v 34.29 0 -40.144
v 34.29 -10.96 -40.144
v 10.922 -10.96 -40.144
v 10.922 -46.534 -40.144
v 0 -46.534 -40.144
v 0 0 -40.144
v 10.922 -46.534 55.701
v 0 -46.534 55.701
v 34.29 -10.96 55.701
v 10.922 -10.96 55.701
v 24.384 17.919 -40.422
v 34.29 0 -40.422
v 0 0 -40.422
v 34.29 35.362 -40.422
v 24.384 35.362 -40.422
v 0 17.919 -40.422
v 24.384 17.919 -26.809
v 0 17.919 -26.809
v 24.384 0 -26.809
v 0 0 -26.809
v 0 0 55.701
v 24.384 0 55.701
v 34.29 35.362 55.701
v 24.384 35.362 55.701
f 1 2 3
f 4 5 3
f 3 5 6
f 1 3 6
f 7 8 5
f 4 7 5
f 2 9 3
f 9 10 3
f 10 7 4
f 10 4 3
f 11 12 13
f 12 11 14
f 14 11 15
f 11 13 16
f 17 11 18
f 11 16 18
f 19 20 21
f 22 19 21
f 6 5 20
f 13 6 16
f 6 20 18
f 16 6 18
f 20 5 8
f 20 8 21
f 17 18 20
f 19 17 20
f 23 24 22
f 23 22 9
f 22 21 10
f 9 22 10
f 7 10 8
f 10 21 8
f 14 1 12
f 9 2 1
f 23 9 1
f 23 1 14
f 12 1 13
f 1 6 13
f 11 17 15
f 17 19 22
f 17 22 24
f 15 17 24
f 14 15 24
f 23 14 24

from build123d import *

# Parameters (mm, degrees)
F1_DEPTH = 10.922
F3_DEPTH = 13.462
F5_DEPTH = 9.906


with BuildPart() as f1:
    # F0 (on Right) → F1 (new body)
    with BuildSketch(Plane.YZ):
        Polygon((0, 55.701409), (-46.533596, 55.701409), (-46.533596, -40.143907), (0, -40.143907), (0, -26.808906), align=None)
        Polygon((17.918905, -26.808906), (0, -26.808906), (0, -40.143907), (0, -40.421717), (17.918905, -40.421717), align=None)
    extrude(amount=F1_DEPTH)

    # F2 (on face) → F3 (join)
    with BuildSketch(Plane.YZ.offset(10.922)):
        Polygon((0, 55.701409), (-10.959693, 55.701409), (-10.959693, -40.143907), (0, -40.143907), (0, -26.808906), align=None)
        Polygon((17.918905, -26.808906), (0, -26.808906), (0, -40.143907), (0, -40.421717), (17.918905, -40.421717), align=None)
    extrude(amount=F3_DEPTH)

    # F4 (on face) → F5 (join)
    with BuildSketch(Plane.YZ.offset(24.384)):
        Polygon((35.362165, 55.701409), (0, 55.701409), (0, -26.808906), (17.918905, -26.808906), (17.918905, -40.421717), (35.362165, -40.421717), align=None)
        Polygon((0, 55.701409), (-10.959693, 55.701409), (-10.959693, -40.143907), (0, -40.143907), (0, -40.421717), (17.918905, -40.421717), (17.918905, -26.808906), (0, -26.808906), align=None)
    extrude(amount=F5_DEPTH)


solid = f1.part
